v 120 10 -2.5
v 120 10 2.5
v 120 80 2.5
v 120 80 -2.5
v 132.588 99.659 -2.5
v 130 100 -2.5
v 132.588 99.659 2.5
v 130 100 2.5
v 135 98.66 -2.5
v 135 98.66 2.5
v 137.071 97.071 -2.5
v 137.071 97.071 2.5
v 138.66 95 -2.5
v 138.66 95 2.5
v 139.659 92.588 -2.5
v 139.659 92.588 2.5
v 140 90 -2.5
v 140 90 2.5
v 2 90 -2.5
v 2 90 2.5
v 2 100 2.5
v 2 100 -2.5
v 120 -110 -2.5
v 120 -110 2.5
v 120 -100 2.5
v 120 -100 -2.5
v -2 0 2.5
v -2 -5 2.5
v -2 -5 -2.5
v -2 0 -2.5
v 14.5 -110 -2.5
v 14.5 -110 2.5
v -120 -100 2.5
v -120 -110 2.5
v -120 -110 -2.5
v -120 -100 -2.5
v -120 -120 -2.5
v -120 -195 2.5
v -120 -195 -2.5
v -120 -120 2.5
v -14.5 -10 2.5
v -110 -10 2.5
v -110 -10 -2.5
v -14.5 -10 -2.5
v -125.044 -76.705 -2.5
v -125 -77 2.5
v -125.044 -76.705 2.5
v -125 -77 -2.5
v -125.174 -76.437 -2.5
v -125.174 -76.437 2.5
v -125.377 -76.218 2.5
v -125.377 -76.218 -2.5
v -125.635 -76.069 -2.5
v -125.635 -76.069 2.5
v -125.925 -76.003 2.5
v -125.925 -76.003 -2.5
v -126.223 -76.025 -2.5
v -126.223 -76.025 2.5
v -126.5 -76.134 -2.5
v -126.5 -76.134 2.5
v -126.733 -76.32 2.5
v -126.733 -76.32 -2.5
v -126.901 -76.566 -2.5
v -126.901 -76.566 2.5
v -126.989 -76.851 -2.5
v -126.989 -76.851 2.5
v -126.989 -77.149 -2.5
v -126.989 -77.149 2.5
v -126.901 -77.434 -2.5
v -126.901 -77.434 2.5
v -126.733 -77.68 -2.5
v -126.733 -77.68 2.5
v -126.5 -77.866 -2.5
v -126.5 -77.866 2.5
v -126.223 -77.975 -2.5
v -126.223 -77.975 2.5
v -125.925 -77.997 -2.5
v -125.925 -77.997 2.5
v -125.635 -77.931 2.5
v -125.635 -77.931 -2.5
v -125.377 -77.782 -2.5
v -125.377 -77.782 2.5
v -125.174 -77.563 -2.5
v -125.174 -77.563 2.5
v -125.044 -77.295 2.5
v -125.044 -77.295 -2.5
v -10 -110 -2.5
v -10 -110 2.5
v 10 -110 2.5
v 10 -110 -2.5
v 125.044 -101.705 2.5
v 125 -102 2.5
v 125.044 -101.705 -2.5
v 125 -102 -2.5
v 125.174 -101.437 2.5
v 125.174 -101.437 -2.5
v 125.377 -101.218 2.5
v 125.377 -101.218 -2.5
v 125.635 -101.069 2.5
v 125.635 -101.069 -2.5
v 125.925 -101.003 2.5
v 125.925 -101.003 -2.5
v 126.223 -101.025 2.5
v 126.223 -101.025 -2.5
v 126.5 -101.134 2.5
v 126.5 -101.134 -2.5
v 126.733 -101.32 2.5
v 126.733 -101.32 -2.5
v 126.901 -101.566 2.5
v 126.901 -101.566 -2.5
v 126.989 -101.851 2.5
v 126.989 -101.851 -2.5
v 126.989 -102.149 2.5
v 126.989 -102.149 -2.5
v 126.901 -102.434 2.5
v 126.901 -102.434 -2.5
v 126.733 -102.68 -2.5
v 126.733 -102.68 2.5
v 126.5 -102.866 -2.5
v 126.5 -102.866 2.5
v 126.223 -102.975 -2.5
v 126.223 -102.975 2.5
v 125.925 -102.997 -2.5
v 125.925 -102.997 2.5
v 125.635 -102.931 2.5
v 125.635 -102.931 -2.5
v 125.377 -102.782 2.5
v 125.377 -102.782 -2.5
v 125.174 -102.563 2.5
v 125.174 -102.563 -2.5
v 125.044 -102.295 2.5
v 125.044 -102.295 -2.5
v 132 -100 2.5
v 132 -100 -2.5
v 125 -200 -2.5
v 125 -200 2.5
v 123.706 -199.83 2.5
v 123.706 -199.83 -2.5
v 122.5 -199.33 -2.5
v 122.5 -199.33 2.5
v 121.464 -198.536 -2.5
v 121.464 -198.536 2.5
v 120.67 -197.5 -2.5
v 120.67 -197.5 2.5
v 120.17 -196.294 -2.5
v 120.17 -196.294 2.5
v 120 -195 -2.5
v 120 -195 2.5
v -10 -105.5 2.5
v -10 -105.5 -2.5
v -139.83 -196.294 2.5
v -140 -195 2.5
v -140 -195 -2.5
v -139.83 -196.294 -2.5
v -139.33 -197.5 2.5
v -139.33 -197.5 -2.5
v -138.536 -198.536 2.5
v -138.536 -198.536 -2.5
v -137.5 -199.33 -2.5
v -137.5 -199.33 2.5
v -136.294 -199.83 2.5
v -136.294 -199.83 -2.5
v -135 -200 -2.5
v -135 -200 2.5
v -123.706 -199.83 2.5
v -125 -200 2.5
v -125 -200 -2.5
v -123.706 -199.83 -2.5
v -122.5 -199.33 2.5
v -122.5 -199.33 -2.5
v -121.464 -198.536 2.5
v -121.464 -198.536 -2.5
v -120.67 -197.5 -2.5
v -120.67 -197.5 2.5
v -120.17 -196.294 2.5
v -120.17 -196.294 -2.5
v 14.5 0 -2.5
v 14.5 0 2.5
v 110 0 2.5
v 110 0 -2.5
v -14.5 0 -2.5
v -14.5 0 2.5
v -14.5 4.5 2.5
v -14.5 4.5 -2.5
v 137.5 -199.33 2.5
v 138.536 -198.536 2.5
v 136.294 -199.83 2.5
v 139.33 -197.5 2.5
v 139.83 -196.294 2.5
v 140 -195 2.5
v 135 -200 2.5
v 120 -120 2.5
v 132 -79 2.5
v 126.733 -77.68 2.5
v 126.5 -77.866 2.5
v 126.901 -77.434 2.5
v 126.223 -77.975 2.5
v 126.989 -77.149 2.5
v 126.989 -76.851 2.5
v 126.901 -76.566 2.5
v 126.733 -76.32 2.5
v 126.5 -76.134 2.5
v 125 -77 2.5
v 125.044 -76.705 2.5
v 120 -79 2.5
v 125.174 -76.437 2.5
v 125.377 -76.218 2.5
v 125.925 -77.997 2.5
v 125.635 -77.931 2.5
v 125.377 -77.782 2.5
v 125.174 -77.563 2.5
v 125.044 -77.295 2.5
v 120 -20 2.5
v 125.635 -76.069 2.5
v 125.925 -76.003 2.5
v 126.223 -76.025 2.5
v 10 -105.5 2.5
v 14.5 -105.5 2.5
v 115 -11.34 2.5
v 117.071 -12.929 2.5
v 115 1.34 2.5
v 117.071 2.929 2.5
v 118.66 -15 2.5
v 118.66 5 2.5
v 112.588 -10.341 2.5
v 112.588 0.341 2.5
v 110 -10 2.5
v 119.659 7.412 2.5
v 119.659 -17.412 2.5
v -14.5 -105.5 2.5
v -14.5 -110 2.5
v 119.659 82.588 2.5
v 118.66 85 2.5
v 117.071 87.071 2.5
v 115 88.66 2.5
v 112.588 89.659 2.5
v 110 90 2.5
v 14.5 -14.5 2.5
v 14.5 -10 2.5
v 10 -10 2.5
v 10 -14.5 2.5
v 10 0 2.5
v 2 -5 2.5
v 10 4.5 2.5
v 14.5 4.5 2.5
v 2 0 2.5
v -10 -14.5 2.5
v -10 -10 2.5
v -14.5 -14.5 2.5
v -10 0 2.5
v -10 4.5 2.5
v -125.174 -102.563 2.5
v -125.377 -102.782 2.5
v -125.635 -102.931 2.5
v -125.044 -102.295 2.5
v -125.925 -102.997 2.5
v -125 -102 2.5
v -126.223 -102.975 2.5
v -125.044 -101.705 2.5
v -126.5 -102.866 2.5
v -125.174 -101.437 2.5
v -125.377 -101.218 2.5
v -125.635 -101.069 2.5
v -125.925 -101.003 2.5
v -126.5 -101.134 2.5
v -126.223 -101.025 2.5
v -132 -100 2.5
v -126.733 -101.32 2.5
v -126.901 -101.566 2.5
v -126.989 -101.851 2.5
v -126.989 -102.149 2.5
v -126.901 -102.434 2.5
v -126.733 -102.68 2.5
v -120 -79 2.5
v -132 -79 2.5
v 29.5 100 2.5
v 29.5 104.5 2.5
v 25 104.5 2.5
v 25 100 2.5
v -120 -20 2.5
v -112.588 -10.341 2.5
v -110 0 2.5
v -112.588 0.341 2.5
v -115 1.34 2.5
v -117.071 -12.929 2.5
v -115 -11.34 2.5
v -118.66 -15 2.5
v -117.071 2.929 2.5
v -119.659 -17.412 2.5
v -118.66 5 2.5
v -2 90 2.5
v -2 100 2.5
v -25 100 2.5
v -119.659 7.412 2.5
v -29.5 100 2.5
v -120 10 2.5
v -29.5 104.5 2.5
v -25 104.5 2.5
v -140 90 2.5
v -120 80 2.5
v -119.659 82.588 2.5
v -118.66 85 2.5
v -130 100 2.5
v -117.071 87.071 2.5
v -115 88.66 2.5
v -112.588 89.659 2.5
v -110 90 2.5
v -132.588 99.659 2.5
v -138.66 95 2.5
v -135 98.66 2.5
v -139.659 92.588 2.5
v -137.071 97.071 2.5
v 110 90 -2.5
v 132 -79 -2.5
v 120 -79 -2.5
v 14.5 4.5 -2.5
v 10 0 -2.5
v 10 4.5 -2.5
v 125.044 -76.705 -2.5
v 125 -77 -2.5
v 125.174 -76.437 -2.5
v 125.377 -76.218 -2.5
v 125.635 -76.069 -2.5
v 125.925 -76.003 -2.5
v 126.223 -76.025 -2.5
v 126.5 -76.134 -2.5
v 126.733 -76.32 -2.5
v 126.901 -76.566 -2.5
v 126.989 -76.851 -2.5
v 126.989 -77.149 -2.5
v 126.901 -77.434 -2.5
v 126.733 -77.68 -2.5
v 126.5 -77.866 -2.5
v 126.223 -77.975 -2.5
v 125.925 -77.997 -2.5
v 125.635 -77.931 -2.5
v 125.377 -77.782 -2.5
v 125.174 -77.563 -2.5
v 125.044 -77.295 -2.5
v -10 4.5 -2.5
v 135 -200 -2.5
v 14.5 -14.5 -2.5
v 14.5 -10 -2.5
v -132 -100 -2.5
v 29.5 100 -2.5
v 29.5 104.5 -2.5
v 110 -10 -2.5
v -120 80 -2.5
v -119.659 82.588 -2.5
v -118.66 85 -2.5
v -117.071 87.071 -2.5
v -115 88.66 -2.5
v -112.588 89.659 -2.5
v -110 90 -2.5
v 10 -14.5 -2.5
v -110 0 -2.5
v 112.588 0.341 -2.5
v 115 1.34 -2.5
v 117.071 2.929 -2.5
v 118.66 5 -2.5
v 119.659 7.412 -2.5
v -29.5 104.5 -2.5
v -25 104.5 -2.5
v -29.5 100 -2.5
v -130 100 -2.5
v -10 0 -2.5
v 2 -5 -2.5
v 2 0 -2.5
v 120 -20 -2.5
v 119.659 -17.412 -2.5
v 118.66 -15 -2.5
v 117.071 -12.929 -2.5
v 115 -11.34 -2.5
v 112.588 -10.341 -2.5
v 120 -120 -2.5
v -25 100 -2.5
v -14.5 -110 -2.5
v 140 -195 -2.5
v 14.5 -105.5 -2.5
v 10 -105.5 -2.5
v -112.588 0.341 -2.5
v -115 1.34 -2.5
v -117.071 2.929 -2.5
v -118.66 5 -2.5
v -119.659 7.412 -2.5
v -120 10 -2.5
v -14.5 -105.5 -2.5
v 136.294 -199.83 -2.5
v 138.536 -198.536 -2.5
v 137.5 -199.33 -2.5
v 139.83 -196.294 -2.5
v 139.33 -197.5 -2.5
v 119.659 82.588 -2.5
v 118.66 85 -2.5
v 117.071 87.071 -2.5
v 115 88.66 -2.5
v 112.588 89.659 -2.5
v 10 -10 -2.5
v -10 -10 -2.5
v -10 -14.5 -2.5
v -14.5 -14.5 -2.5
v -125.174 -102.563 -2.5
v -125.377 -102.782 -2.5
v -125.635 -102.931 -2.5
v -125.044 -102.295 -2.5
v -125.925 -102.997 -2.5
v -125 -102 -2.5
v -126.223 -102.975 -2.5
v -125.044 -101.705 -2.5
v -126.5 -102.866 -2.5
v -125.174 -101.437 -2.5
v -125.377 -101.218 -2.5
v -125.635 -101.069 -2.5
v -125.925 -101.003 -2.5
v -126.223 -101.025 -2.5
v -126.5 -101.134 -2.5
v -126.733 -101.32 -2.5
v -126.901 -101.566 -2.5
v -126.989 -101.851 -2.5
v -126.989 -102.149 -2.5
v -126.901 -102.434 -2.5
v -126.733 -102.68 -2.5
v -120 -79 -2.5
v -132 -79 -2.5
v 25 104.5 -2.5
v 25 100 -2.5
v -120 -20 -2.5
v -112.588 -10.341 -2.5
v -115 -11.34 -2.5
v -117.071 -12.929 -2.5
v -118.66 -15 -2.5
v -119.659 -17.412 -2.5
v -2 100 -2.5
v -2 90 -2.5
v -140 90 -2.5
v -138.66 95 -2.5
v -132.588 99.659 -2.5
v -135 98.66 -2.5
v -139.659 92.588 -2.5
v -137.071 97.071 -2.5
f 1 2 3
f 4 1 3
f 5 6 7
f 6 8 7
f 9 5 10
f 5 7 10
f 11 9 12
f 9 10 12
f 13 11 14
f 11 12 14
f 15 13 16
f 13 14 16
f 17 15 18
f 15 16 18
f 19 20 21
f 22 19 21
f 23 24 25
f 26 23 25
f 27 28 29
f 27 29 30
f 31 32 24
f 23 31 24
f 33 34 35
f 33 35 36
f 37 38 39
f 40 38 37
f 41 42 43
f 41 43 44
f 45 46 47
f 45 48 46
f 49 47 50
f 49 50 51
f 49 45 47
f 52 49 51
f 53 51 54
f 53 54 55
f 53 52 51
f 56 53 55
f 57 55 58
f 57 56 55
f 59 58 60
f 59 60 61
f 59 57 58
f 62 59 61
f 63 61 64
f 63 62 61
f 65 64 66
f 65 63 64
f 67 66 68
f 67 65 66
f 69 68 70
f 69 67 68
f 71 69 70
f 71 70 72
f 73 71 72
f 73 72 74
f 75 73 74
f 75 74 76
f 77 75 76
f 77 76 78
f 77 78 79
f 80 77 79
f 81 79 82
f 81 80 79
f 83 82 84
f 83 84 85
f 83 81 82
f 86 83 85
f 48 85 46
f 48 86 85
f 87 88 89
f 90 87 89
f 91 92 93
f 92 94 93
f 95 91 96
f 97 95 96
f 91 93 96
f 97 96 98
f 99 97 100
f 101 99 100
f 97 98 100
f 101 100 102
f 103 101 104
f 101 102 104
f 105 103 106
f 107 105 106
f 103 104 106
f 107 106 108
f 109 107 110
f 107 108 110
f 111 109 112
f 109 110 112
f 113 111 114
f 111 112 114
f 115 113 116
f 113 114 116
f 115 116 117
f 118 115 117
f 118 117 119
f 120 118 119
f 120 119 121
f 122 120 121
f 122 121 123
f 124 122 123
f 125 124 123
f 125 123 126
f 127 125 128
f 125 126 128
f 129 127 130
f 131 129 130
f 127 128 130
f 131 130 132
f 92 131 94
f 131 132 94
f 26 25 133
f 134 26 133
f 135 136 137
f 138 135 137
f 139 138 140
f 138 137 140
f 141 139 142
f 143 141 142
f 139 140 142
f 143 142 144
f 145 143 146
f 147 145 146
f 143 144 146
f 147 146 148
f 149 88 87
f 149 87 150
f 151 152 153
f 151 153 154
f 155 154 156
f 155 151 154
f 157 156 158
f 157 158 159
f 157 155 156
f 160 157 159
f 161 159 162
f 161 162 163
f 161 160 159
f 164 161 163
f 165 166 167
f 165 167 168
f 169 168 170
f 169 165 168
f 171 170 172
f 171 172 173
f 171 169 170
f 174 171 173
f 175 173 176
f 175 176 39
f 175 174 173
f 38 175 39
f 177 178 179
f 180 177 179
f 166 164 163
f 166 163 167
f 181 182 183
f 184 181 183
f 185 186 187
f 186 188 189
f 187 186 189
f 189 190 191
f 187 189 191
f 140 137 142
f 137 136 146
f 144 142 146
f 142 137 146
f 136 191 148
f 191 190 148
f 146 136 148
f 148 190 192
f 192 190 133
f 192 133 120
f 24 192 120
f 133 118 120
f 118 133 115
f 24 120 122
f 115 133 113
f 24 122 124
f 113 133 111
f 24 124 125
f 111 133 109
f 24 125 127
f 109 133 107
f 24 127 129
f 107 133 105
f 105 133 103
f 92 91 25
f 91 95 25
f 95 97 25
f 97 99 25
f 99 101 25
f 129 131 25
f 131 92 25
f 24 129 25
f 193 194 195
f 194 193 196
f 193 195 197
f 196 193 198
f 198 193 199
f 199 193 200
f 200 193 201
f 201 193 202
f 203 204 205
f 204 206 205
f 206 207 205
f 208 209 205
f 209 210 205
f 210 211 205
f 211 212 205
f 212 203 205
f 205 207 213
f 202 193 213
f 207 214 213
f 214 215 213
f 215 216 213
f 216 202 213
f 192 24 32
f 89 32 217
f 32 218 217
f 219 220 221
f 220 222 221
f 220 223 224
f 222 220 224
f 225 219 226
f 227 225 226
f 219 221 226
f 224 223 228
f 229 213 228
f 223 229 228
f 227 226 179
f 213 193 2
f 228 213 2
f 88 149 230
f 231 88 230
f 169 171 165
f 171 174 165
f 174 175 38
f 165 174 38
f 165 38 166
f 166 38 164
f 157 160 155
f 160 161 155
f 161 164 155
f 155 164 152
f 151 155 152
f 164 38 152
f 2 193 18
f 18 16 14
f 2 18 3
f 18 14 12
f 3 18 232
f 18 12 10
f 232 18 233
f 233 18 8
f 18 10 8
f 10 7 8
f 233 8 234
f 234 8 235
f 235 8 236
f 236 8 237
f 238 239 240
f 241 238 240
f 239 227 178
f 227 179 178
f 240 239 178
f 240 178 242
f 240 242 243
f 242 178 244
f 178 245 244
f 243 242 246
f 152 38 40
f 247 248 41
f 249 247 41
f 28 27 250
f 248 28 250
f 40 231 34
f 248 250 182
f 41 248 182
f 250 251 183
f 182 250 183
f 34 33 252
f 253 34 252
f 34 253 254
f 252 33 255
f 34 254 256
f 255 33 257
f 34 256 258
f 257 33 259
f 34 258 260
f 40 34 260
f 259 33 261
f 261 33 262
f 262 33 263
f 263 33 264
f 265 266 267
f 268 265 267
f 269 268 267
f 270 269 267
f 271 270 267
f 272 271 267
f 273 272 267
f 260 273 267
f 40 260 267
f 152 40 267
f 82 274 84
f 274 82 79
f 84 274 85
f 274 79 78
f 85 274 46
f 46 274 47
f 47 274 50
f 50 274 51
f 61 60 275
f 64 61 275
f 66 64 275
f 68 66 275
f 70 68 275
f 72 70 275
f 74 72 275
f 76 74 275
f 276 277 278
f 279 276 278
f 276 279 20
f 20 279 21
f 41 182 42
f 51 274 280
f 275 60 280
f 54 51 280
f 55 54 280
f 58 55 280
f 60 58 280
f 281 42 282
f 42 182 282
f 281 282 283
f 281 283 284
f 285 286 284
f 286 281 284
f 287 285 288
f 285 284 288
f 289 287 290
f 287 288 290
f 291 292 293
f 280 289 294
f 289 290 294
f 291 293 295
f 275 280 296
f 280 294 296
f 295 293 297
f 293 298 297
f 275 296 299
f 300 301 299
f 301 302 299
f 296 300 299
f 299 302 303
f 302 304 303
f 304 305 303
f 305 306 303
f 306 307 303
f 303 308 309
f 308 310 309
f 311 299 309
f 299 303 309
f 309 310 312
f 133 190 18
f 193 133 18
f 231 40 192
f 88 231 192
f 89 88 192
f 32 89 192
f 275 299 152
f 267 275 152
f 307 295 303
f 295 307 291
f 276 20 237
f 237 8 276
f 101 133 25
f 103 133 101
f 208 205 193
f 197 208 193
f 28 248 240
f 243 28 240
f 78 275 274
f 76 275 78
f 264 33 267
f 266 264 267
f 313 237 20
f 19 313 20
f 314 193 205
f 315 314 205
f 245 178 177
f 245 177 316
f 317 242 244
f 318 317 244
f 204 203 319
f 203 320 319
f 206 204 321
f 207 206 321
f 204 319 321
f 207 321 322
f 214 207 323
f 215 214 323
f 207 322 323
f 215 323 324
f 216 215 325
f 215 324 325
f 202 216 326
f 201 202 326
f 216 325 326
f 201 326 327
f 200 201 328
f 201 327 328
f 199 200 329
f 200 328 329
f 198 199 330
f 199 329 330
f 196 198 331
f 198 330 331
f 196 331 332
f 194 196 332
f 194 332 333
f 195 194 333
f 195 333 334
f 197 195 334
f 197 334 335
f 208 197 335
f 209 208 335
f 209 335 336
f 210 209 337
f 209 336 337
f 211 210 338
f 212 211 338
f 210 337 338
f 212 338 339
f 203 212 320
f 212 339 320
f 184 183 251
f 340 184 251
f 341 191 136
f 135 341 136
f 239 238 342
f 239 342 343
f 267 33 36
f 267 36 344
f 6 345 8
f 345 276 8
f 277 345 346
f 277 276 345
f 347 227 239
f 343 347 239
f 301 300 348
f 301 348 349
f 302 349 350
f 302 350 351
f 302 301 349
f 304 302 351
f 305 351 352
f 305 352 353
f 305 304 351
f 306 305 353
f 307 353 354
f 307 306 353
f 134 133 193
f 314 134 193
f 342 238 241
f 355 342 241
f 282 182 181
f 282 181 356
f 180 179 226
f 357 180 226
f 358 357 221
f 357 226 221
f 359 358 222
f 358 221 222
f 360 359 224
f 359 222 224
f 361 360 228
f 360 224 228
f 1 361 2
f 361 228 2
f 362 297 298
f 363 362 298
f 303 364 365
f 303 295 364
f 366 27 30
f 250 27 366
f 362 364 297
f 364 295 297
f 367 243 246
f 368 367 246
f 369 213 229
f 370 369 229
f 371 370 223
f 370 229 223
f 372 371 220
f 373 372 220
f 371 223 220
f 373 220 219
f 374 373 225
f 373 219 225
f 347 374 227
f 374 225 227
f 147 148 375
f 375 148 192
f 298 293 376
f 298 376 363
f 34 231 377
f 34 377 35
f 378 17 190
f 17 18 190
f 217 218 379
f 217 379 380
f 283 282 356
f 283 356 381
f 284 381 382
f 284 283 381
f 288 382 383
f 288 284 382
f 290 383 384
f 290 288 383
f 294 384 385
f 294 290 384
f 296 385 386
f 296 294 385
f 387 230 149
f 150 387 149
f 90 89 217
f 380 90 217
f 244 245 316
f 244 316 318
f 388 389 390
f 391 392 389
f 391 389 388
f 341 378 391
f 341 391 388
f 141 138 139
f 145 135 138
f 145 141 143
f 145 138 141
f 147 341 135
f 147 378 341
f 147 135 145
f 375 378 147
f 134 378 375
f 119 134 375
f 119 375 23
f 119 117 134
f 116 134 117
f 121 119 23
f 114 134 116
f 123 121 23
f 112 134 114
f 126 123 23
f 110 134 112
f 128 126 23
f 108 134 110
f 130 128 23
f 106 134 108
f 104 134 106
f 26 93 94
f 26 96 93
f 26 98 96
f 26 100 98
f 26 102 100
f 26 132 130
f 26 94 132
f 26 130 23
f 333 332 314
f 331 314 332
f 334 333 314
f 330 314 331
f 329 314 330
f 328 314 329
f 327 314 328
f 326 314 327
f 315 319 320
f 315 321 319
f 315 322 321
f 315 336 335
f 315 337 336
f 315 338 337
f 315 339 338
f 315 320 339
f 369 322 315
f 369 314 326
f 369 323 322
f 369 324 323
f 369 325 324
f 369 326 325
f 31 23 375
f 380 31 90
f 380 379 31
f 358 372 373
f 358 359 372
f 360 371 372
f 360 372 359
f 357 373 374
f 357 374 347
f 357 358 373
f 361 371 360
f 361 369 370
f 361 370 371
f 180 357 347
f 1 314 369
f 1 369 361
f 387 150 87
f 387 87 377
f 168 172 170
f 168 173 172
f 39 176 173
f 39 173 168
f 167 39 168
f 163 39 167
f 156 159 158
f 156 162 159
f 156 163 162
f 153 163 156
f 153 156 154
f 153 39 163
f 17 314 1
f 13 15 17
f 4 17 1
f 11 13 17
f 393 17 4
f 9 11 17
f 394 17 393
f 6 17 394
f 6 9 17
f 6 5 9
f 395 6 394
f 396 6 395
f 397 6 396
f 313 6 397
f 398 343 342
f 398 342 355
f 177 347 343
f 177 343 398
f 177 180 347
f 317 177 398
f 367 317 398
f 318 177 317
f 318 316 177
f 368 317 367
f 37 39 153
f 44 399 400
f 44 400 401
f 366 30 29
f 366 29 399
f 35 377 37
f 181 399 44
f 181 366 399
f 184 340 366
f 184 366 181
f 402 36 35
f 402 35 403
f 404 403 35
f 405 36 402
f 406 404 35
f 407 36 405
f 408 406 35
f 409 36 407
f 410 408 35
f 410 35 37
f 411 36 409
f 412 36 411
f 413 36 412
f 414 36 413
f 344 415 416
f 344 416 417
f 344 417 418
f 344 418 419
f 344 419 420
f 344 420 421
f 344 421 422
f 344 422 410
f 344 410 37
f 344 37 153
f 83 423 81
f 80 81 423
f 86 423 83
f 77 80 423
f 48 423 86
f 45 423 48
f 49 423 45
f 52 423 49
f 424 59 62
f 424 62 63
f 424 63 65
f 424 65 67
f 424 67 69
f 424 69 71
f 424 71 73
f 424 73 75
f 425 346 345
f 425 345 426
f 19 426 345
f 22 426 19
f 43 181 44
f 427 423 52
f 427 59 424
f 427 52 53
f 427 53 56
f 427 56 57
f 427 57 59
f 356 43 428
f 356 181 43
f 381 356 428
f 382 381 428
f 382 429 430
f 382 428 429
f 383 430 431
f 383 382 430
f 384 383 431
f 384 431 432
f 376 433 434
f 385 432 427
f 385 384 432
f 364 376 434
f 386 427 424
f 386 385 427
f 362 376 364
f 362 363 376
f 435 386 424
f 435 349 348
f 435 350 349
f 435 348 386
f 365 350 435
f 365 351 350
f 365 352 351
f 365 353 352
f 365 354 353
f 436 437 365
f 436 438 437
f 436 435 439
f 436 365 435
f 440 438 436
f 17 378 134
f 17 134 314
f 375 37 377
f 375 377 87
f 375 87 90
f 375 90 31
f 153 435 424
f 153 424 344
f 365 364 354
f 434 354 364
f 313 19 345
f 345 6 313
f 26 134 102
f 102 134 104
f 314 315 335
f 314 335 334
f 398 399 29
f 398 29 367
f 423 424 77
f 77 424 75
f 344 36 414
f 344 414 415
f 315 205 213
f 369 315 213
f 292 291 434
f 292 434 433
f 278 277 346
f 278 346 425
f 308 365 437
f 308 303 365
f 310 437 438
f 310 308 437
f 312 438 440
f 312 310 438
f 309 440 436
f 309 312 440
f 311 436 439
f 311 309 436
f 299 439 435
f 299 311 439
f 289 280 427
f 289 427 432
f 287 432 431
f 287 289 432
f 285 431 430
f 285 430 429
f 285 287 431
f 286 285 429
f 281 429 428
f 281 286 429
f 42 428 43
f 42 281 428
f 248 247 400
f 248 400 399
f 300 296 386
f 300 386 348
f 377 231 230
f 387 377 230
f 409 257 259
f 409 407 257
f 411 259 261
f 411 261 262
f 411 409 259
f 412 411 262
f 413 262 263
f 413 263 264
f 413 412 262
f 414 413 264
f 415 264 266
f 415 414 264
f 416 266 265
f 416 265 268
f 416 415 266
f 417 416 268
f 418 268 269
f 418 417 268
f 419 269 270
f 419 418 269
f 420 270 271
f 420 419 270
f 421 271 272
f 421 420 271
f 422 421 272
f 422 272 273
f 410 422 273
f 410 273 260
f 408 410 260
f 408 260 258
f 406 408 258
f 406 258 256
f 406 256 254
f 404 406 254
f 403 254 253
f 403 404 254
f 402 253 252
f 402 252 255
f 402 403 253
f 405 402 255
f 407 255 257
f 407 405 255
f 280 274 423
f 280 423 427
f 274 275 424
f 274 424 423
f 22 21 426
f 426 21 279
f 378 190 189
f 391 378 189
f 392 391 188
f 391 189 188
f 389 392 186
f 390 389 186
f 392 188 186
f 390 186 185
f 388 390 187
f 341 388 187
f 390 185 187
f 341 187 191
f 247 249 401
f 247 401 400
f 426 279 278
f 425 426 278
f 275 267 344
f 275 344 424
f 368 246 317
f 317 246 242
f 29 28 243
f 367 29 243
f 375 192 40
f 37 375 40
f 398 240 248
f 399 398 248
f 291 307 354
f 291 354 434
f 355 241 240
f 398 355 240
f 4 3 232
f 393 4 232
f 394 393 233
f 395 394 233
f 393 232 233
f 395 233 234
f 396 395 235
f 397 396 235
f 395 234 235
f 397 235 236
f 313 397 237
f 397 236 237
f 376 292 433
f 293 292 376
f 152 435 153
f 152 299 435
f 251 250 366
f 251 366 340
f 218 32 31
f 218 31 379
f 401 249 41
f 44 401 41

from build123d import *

# Parameters (mm, degrees)
SKETCH1_R           = 1
SKETCH1_W           = 4.5
SKETCH1_H           = 4.5
BOSS_EXTRUDE1_DEPTH = 2.5


with BuildPart() as part:
    # Sketch1 → Boss-Extrude1 (new body, symmetric)
    with BuildSketch(Plane.XY):
        with BuildLine():
            Line((-140, 90), (-140, -195))
            ThreePointArc((-140, -195), (-138.535533906, -198.535533906), (-135, -200))
            Line((-135, -200), (-125, -200))
            ThreePointArc((-125, -200), (-121.464466094, -198.535533906), (-120, -195))
            Line((-120, -195), (-120, -100))
            Line((-120, -100), (-132, -100))
            Line((-132, -100), (-132, -79))
            Line((-132, -79), (-120, -79))
            Line((-120, -79), (-120, -20))
            ThreePointArc((-120, -20), (-117.071067812, -12.928932188), (-110, -10))
            Line((-110, -10), (0, -10))
            Line((0, -10), (0, -5))
            Line((0, -5), (-2, -5))
            Line((-2, -5), (-2, 0))
            Line((-2, 0), (-110, 0))
            ThreePointArc((-110, 0), (-117.071067812, 2.928932188), (-120, 10))
            Line((-120, 10), (-120, 80))
            ThreePointArc((-120, 80), (-117.071067812, 87.071067812), (-110, 90))
            Line((-110, 90), (-2, 90))
            Line((-2, 90), (-2, 100))
            Line((-2, 100), (-120, 100))
            Line((-120, 100), (-130, 100))
            ThreePointArc((-130, 100), (-137.071067812, 97.071067812), (-140, 90))
        make_face()
        with Locations((-126, -77)):
            Circle(SKETCH1_R, mode=Mode.SUBTRACT)
        with Locations((-126, -102)):
            Circle(SKETCH1_R, mode=Mode.SUBTRACT)
        Polygon((-14.5, -110), (-120, -110), (-120, -120), (0, -120), (0, -110), (-10, -110), align=None)
        with Locations((-12.25, -107.75)):
            Rectangle(SKETCH1_W, SKETCH1_H)
        with Locations((-12.25, 2.25)):
            Rectangle(SKETCH1_W, SKETCH1_H)
        with Locations((-12.25, -12.25)):
            Rectangle(SKETCH1_W, SKETCH1_H)
        with Locations((-27.25, 102.25)):
            Rectangle(SKETCH1_W, SKETCH1_H)
    boss_extrude1 = extrude(amount=BOSS_EXTRUDE1_DEPTH, both=True)

    # Mirror1: Boss-Extrude1 across plane
    add(boss_extrude1.mirror(Plane(origin=(0, 0, 0), x_dir=(0, 0, 1), z_dir=(1, 0, 0))))


solid = part.part
